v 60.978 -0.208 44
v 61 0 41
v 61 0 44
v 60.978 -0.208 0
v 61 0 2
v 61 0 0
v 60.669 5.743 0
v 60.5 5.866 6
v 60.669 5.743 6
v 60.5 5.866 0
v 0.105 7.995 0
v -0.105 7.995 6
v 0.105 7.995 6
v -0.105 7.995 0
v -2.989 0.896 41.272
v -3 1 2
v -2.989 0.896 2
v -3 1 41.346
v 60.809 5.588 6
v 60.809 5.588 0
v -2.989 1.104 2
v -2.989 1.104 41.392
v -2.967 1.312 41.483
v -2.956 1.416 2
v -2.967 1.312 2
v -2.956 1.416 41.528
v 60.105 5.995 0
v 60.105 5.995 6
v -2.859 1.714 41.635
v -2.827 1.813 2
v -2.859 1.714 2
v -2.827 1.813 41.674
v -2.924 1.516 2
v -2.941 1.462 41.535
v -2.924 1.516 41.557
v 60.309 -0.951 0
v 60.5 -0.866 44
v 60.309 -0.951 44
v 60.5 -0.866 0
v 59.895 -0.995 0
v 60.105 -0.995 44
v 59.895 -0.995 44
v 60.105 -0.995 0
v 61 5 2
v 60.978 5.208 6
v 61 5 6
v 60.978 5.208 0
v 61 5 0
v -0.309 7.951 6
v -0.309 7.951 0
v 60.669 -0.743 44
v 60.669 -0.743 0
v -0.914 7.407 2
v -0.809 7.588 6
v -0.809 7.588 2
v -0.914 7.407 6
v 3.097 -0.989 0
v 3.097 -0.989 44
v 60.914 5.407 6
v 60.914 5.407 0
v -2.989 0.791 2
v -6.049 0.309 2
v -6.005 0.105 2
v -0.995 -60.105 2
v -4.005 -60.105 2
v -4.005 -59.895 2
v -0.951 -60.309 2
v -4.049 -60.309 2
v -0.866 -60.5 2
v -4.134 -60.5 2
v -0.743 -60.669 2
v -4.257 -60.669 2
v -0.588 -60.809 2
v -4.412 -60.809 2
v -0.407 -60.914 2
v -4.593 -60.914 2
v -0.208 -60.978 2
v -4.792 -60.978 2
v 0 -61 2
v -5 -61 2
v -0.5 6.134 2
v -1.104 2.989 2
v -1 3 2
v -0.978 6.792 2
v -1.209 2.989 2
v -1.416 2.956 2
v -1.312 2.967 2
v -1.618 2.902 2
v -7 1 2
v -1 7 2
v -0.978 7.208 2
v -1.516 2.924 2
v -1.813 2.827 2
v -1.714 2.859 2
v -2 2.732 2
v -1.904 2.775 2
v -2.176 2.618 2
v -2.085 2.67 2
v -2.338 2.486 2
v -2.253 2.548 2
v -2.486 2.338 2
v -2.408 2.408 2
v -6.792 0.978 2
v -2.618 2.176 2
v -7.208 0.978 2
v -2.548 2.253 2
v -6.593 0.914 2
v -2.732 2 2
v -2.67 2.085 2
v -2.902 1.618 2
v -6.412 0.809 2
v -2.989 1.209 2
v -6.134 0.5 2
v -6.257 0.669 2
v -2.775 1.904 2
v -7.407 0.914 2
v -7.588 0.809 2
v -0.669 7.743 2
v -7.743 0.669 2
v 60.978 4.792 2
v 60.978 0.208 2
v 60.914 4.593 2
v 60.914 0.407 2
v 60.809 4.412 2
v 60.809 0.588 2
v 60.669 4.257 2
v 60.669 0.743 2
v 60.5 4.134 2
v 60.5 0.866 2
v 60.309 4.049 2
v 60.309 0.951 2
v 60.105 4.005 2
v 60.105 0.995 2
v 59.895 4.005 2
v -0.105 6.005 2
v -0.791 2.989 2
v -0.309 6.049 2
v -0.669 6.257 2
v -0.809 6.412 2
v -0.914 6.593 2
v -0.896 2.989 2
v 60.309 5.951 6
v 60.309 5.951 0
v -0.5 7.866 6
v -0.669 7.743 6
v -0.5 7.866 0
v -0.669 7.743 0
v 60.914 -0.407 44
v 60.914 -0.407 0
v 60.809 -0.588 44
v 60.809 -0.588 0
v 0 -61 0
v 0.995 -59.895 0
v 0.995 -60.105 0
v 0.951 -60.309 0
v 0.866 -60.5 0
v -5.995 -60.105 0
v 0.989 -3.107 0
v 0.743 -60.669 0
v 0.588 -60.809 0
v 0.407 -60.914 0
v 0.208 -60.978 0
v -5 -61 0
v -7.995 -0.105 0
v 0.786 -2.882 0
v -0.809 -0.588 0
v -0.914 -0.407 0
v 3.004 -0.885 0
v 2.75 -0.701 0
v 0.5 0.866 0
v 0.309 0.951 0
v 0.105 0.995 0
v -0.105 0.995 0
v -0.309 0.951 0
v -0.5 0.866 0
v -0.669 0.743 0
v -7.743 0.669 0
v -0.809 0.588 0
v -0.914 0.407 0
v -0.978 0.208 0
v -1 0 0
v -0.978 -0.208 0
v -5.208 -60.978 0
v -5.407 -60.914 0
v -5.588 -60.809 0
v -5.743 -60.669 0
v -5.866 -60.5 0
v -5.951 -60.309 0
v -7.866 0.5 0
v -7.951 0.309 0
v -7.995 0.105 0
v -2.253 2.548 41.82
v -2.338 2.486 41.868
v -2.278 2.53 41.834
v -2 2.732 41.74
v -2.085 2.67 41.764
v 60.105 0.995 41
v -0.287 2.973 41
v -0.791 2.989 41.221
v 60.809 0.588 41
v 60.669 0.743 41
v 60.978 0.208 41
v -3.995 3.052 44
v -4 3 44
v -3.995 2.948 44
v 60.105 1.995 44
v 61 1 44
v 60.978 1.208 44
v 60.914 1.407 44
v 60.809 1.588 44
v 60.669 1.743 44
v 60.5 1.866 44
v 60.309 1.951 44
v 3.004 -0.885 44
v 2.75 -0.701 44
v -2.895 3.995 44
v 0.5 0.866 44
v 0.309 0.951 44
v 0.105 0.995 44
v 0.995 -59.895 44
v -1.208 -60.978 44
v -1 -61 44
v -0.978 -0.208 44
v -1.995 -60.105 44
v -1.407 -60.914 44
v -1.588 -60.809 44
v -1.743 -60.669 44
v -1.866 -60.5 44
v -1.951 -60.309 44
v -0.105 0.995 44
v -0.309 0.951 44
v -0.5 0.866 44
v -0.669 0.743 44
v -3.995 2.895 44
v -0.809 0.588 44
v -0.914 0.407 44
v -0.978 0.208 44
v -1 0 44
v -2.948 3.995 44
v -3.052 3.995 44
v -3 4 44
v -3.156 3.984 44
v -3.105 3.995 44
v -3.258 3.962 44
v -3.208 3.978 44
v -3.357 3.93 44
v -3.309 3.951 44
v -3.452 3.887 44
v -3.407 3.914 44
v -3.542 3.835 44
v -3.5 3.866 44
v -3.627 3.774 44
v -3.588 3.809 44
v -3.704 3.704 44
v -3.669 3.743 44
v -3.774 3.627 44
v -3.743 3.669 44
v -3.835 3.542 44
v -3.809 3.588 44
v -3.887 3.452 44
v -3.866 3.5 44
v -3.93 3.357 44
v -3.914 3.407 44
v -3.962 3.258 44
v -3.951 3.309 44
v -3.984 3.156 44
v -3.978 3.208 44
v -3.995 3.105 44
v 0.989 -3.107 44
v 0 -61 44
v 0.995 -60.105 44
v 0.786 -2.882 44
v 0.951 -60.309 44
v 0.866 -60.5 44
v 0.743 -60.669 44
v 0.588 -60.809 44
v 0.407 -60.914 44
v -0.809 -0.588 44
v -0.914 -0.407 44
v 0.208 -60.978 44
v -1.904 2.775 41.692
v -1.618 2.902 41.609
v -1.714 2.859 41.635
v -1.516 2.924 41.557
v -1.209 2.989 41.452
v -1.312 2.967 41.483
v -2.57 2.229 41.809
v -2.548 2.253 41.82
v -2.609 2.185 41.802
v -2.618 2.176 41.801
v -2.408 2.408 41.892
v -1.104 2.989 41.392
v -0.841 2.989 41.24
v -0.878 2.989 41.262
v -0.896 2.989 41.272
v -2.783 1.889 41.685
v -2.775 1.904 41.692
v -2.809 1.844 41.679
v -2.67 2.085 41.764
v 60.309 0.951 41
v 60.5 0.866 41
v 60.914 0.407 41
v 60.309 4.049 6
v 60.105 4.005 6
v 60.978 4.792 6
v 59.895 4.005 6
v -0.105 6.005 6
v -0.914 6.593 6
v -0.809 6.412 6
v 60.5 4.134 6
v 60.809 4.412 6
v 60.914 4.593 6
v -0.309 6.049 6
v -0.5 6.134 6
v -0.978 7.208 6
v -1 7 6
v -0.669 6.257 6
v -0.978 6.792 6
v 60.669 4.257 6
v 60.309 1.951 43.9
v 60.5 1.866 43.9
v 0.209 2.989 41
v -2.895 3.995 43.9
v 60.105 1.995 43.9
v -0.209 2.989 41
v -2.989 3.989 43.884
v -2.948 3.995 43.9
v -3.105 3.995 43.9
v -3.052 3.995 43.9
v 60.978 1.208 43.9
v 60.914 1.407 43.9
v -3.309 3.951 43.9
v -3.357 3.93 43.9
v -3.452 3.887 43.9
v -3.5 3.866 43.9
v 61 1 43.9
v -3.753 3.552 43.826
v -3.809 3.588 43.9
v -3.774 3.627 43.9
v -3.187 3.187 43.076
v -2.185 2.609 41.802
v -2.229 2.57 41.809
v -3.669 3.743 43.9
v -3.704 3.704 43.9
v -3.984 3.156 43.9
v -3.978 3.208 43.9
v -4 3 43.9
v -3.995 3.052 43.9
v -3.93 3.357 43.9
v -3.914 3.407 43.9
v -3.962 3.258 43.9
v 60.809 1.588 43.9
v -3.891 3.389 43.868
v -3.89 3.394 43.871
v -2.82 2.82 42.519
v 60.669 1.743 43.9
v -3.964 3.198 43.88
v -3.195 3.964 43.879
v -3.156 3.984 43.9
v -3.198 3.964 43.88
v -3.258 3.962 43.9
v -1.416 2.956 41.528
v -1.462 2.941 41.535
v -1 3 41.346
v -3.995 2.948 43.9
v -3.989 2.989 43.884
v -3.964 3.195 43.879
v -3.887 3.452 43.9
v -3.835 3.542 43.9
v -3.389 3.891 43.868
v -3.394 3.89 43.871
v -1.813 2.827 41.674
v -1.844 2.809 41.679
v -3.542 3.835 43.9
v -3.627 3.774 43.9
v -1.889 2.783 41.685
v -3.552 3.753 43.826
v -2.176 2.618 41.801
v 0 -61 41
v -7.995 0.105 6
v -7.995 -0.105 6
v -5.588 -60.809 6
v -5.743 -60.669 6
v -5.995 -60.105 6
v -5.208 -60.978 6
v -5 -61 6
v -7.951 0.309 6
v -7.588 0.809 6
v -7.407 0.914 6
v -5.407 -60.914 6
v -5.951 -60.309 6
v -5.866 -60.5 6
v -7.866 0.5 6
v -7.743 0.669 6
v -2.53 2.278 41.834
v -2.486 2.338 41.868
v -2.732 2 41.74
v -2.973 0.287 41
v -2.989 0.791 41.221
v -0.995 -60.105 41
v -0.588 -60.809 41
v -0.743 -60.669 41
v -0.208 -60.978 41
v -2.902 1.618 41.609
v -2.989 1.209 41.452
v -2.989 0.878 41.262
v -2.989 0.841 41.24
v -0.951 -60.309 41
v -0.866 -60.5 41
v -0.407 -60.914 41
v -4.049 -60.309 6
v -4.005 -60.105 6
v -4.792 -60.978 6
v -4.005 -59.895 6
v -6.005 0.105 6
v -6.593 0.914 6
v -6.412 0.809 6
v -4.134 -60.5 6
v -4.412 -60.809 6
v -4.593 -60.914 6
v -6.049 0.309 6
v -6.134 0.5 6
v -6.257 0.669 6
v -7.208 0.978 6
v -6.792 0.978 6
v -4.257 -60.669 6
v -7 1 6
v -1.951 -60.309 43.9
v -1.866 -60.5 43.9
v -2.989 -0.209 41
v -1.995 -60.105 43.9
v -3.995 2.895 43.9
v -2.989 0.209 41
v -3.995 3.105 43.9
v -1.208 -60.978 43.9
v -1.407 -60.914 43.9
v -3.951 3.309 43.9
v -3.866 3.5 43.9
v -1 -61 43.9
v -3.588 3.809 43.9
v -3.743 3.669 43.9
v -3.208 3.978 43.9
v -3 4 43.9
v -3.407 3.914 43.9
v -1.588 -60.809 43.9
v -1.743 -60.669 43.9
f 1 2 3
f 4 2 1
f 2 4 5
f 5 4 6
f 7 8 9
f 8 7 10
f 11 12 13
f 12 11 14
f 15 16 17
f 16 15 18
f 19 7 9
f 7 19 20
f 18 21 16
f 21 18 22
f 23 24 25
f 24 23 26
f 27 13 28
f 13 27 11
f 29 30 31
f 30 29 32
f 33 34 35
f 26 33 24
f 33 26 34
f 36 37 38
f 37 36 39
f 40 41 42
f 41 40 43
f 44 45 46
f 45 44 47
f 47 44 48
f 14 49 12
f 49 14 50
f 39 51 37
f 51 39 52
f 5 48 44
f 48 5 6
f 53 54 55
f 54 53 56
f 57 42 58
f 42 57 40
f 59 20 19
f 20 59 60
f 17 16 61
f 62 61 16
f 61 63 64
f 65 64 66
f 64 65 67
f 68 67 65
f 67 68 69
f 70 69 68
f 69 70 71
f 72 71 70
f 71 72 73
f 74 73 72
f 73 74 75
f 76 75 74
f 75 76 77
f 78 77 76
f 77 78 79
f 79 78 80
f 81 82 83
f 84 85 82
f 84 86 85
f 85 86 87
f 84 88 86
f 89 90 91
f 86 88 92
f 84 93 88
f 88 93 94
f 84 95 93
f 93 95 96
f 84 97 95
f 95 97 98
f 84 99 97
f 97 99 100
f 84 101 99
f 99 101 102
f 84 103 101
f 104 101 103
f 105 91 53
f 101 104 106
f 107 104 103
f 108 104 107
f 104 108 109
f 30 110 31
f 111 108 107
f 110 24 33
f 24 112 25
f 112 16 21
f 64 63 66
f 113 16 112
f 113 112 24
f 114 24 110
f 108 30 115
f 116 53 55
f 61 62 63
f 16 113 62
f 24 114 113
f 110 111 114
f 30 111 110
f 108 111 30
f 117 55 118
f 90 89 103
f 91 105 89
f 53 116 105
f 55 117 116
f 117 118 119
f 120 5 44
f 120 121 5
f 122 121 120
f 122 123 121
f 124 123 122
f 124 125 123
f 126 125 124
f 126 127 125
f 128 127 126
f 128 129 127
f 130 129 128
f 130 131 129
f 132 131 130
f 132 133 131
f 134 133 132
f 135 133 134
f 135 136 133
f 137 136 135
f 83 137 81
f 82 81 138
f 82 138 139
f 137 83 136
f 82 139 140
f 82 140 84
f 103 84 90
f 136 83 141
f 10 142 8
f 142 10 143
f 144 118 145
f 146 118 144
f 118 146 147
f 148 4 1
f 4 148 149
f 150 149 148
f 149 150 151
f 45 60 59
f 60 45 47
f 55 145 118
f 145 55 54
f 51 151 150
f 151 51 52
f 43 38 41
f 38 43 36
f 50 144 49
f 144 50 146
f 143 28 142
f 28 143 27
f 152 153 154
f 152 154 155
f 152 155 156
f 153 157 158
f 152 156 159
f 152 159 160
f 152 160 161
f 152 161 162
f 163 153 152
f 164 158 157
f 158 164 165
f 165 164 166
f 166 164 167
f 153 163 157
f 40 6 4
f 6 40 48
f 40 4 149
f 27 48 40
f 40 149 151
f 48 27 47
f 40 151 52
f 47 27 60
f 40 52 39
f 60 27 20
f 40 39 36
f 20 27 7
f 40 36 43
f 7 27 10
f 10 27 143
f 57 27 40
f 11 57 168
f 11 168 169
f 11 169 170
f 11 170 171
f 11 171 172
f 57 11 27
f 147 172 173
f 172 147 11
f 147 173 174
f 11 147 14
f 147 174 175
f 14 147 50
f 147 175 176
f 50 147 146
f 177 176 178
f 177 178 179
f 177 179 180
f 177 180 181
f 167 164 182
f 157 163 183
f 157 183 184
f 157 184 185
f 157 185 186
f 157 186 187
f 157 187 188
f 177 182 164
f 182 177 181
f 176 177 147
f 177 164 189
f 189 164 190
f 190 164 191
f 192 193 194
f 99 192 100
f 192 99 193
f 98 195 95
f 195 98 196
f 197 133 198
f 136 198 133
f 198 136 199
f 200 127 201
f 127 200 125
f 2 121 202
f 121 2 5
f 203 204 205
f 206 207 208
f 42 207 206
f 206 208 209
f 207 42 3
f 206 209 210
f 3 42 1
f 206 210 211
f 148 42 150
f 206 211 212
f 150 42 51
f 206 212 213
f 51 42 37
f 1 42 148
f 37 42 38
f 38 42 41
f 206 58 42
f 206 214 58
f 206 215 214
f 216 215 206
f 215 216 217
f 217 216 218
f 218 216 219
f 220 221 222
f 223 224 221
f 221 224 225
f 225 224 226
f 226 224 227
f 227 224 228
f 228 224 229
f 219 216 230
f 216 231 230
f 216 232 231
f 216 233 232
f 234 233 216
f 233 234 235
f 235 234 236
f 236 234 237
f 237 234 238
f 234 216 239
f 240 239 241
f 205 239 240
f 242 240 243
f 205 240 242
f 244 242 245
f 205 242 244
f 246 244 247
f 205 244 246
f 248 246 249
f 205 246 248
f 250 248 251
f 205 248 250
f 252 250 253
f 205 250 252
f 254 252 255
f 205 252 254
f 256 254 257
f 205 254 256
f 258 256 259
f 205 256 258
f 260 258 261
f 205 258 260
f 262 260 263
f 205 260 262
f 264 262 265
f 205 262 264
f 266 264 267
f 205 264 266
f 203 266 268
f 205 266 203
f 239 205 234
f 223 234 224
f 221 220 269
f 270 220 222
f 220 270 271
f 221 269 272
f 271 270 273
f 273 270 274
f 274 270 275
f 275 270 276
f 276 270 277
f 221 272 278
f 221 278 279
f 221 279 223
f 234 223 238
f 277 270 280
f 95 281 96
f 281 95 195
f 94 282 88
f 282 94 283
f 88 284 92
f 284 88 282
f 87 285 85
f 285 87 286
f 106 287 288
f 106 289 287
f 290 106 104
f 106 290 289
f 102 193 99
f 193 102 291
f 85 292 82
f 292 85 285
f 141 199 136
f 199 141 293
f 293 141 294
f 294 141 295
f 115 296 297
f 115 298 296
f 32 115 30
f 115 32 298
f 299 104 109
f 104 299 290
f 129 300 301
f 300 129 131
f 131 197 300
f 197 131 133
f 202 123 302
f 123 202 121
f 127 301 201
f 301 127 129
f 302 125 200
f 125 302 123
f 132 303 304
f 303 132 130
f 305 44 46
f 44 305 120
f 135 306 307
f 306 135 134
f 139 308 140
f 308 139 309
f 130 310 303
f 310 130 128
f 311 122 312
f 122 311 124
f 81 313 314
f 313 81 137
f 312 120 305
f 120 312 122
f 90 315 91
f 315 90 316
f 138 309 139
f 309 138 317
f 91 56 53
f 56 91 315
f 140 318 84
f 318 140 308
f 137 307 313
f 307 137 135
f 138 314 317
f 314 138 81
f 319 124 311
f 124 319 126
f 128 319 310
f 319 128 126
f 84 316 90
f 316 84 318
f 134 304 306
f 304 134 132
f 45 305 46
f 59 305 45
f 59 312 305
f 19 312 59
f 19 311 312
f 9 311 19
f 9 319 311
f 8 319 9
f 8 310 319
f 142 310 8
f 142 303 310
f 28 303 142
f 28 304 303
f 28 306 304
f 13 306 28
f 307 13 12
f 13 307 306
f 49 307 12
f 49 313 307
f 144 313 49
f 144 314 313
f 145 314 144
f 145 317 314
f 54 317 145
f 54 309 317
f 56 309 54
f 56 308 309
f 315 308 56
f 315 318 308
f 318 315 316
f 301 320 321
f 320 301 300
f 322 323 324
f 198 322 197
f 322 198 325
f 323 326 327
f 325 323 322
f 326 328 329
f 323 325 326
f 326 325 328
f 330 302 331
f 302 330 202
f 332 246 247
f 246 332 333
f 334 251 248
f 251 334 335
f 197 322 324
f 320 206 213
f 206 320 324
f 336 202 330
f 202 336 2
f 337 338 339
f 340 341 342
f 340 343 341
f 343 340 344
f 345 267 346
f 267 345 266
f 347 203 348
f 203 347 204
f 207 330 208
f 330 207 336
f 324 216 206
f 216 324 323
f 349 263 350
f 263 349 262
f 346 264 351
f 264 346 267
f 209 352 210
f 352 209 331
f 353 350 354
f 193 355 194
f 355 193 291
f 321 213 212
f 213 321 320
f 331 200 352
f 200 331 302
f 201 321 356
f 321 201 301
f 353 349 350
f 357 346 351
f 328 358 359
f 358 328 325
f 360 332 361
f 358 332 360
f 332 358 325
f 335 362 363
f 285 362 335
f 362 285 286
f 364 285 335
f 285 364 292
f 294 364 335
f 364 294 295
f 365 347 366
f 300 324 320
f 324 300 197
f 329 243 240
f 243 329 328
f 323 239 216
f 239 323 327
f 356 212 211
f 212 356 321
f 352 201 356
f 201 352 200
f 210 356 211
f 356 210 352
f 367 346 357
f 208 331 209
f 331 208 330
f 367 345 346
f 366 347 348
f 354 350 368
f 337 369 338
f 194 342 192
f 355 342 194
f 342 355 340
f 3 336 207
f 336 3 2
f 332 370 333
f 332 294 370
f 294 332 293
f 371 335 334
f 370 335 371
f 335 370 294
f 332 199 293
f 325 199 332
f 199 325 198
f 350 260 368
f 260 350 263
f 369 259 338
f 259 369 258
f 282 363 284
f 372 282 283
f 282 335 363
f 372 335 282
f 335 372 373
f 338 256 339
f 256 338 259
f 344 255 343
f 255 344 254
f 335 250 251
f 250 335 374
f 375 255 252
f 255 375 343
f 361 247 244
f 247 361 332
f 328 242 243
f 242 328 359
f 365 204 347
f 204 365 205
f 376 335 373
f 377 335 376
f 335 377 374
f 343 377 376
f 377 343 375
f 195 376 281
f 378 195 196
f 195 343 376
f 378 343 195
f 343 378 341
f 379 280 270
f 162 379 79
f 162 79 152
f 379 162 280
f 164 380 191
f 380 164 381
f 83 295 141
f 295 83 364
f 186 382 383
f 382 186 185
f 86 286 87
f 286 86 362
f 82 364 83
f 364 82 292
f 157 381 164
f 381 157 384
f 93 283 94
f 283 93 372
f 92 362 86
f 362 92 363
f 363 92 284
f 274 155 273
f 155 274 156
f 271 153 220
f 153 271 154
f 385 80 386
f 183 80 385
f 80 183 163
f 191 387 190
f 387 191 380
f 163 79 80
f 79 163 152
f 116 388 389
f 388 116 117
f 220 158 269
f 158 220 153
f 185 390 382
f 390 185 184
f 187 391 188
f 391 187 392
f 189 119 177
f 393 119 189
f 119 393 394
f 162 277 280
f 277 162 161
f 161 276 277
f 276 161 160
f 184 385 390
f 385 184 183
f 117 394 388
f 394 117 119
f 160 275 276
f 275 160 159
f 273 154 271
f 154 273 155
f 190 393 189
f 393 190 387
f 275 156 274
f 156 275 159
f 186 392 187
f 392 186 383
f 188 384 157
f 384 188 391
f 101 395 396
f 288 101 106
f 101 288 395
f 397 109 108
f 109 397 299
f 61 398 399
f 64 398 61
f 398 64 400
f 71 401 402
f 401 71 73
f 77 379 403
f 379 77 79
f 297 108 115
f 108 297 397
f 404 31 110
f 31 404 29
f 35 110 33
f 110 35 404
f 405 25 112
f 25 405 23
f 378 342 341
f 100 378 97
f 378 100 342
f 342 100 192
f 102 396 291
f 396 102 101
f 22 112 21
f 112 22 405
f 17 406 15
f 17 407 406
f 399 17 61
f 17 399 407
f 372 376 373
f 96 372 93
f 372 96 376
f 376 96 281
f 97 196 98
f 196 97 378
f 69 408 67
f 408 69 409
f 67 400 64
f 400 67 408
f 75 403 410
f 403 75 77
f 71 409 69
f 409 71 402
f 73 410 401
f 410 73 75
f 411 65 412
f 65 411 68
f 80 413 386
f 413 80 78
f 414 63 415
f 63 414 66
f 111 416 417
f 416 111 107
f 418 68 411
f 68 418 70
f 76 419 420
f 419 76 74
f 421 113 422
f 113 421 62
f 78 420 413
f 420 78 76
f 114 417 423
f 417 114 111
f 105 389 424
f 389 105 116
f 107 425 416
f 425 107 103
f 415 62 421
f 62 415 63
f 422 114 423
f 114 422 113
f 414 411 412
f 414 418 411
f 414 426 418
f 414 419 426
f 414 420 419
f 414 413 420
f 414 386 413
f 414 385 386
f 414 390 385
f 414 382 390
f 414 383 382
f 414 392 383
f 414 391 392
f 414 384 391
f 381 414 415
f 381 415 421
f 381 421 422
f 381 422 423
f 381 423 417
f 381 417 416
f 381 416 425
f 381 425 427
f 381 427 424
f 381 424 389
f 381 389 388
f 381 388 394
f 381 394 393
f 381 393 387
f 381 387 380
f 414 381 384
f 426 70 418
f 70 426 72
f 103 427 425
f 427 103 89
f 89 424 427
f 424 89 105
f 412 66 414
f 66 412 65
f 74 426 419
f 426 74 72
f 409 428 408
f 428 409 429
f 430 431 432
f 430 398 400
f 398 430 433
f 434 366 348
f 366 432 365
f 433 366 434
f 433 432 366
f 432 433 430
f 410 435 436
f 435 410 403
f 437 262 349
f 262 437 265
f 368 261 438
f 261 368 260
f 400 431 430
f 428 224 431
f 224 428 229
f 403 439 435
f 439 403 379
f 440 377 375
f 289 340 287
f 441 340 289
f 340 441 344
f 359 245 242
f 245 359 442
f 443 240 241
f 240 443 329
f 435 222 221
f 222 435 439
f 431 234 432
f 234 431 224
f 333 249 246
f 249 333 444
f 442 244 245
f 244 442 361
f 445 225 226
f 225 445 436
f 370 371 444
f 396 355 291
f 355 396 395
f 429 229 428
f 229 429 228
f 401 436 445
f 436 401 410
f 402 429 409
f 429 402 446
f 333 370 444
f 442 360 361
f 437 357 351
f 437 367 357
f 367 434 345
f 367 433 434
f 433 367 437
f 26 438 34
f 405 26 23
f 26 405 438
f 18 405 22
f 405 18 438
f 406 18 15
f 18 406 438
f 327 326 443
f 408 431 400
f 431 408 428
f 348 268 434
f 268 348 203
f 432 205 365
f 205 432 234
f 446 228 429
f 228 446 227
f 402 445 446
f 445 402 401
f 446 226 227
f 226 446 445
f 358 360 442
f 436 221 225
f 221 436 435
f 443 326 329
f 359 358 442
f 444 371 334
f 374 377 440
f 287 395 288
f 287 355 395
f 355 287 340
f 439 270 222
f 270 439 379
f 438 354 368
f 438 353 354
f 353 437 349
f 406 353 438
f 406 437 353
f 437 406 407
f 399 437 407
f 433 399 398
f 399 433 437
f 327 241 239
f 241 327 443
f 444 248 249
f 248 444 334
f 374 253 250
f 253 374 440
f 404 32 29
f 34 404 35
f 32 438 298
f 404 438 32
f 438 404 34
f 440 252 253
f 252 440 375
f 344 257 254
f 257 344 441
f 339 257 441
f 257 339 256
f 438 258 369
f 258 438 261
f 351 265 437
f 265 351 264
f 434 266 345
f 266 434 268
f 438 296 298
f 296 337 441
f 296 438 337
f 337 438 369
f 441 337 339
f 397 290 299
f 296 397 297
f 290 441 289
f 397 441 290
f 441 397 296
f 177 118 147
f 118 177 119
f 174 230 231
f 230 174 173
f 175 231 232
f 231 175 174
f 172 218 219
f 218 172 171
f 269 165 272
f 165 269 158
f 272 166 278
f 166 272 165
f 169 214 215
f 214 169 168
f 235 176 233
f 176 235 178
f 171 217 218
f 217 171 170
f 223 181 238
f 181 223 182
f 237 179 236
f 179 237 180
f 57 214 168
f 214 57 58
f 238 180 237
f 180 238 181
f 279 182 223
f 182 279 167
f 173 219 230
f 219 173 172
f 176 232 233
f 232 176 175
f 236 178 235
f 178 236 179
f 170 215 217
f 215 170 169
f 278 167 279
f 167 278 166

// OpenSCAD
// [FL_INDEX: keywords="openscad, 3d_parametric, Strap_Clamp_Corner_Bracket, csg_solid" | COT="Parametric OpenSCAD design from 3DCodeverse"]
// Title: Strap Clamp Corner Bracket



// How wide is the strap and any extra play you want added
StrapWidth = 40;
// Space for the gap for the hook to hold the clamp corner on the strap
StrapThickness = 3;

// Minimum Thickness of the clamp corner body. It will be twice as thick in the corner
ClampThickness = 2;
// How long to make the clamp from corner to end
ClampLength = 60 ;

// Angle too be clamped
ClampAngle = 90;



difference()
{
	CornerBracket();
	// Make a spot for the glue to sqeeze out
	hull()
	{	
		cylinder(h = StrapWidth + ClampThickness * 2, r=ClampThickness * .5 , $fs=0.01);	
		translate([ClampThickness  , -ClampThickness   , 0]) cylinder(h = StrapWidth + ClampThickness * 2, r=ClampThickness * .75 , $fs=0.01);	
	}


}

module CornerBracket()
{
	frame();
	rotate(a = ClampAngle, v = [ 0, 0, -1]) mirror([0, 1, 0]) frame();
	
	hull ()
	{
		OutsideCorner();
		rotate(a = ClampAngle, v = [ 0, 0, -1]) mirror([0, 1, 0]) OutsideCorner();
	}
}		

module frame ()
{
 	//Base
     hull(){
		translate(v = [ClampLength, 0, 0]) cylinder(h = ClampThickness, r=ClampThickness * .5, $fs=0.01);
		translate(v = [-ClampThickness * .5, ClampThickness * .5, 0]) cylinder(h = ClampThickness, r=ClampThickness , $fs=0.01);	
		translate(v = [0,  (ClampThickness  * 2 + StrapThickness)  , 0])  cylinder(h = ClampThickness , r=ClampThickness * .5 , $fs=0.01);
		translate(v = [ClampLength,  (ClampThickness + StrapThickness) , 0])  cylinder(h = ClampThickness , r=ClampThickness * .5, $fs=0.01);
	}

       //Sides
	hull(){
		// Narrow side
		translate(v = [ClampLength, 0, 0]) cylinder(h = StrapWidth + ClampThickness * 2, r=ClampThickness * .5, $fs=0.01);
		// Wide side
		translate(v = [-ClampThickness * .5, ClampThickness * .5, 0]) cylinder(h = StrapWidth + ClampThickness * 2, r=ClampThickness , $fs=0.01);	
	}
	//Short Side
	hull(){
		translate(v = [0,  (ClampThickness  * 2 + StrapThickness)  , 0])  cylinder(h = StrapWidth * .1 + ClampThickness , r=ClampThickness  * .5, $fs=0.01);
		translate(v = [ClampLength,  (ClampThickness + StrapThickness) , 0])  cylinder(h = StrapWidth * .1 + ClampThickness , r=ClampThickness * .5, $fs=0.01);
	}
	//Upper step Side
	hull(){
		// inline part
		translate(v = [0,  ClampThickness *.5  , StrapWidth + ClampThickness * 2 - StrapThickness])  cylinder(h = StrapThickness , r=ClampThickness , $fs=0.01);
		translate(v = [ClampLength,  0  , StrapWidth + ClampThickness * 2 - StrapThickness])  cylinder(h = StrapThickness , r=ClampThickness * .5, $fs=0.01);
		// Outside step part
		translate(v = [-ClampThickness * 1.5,  ClampThickness * 1.5 , StrapWidth + ClampThickness * 2 - .1])  cylinder(h = .1 , r=ClampThickness  * .5, $fs=0.01);
		translate(v = [ClampLength,  ClampThickness *.5  , StrapWidth + ClampThickness * 2 - .1])  cylinder(h = .1 , r=ClampThickness * .5, $fs=0.01);
	}
}

module OutsideCorner()
{
	cylinder(h = ClampThickness, r=ClampThickness * .5 , $fs=0.01);	
	translate(v = [0,  (ClampThickness  * 2 + StrapThickness)  , 0])  cylinder(h = ClampThickness , r=ClampThickness * .5 , $fs=0.01);
}
